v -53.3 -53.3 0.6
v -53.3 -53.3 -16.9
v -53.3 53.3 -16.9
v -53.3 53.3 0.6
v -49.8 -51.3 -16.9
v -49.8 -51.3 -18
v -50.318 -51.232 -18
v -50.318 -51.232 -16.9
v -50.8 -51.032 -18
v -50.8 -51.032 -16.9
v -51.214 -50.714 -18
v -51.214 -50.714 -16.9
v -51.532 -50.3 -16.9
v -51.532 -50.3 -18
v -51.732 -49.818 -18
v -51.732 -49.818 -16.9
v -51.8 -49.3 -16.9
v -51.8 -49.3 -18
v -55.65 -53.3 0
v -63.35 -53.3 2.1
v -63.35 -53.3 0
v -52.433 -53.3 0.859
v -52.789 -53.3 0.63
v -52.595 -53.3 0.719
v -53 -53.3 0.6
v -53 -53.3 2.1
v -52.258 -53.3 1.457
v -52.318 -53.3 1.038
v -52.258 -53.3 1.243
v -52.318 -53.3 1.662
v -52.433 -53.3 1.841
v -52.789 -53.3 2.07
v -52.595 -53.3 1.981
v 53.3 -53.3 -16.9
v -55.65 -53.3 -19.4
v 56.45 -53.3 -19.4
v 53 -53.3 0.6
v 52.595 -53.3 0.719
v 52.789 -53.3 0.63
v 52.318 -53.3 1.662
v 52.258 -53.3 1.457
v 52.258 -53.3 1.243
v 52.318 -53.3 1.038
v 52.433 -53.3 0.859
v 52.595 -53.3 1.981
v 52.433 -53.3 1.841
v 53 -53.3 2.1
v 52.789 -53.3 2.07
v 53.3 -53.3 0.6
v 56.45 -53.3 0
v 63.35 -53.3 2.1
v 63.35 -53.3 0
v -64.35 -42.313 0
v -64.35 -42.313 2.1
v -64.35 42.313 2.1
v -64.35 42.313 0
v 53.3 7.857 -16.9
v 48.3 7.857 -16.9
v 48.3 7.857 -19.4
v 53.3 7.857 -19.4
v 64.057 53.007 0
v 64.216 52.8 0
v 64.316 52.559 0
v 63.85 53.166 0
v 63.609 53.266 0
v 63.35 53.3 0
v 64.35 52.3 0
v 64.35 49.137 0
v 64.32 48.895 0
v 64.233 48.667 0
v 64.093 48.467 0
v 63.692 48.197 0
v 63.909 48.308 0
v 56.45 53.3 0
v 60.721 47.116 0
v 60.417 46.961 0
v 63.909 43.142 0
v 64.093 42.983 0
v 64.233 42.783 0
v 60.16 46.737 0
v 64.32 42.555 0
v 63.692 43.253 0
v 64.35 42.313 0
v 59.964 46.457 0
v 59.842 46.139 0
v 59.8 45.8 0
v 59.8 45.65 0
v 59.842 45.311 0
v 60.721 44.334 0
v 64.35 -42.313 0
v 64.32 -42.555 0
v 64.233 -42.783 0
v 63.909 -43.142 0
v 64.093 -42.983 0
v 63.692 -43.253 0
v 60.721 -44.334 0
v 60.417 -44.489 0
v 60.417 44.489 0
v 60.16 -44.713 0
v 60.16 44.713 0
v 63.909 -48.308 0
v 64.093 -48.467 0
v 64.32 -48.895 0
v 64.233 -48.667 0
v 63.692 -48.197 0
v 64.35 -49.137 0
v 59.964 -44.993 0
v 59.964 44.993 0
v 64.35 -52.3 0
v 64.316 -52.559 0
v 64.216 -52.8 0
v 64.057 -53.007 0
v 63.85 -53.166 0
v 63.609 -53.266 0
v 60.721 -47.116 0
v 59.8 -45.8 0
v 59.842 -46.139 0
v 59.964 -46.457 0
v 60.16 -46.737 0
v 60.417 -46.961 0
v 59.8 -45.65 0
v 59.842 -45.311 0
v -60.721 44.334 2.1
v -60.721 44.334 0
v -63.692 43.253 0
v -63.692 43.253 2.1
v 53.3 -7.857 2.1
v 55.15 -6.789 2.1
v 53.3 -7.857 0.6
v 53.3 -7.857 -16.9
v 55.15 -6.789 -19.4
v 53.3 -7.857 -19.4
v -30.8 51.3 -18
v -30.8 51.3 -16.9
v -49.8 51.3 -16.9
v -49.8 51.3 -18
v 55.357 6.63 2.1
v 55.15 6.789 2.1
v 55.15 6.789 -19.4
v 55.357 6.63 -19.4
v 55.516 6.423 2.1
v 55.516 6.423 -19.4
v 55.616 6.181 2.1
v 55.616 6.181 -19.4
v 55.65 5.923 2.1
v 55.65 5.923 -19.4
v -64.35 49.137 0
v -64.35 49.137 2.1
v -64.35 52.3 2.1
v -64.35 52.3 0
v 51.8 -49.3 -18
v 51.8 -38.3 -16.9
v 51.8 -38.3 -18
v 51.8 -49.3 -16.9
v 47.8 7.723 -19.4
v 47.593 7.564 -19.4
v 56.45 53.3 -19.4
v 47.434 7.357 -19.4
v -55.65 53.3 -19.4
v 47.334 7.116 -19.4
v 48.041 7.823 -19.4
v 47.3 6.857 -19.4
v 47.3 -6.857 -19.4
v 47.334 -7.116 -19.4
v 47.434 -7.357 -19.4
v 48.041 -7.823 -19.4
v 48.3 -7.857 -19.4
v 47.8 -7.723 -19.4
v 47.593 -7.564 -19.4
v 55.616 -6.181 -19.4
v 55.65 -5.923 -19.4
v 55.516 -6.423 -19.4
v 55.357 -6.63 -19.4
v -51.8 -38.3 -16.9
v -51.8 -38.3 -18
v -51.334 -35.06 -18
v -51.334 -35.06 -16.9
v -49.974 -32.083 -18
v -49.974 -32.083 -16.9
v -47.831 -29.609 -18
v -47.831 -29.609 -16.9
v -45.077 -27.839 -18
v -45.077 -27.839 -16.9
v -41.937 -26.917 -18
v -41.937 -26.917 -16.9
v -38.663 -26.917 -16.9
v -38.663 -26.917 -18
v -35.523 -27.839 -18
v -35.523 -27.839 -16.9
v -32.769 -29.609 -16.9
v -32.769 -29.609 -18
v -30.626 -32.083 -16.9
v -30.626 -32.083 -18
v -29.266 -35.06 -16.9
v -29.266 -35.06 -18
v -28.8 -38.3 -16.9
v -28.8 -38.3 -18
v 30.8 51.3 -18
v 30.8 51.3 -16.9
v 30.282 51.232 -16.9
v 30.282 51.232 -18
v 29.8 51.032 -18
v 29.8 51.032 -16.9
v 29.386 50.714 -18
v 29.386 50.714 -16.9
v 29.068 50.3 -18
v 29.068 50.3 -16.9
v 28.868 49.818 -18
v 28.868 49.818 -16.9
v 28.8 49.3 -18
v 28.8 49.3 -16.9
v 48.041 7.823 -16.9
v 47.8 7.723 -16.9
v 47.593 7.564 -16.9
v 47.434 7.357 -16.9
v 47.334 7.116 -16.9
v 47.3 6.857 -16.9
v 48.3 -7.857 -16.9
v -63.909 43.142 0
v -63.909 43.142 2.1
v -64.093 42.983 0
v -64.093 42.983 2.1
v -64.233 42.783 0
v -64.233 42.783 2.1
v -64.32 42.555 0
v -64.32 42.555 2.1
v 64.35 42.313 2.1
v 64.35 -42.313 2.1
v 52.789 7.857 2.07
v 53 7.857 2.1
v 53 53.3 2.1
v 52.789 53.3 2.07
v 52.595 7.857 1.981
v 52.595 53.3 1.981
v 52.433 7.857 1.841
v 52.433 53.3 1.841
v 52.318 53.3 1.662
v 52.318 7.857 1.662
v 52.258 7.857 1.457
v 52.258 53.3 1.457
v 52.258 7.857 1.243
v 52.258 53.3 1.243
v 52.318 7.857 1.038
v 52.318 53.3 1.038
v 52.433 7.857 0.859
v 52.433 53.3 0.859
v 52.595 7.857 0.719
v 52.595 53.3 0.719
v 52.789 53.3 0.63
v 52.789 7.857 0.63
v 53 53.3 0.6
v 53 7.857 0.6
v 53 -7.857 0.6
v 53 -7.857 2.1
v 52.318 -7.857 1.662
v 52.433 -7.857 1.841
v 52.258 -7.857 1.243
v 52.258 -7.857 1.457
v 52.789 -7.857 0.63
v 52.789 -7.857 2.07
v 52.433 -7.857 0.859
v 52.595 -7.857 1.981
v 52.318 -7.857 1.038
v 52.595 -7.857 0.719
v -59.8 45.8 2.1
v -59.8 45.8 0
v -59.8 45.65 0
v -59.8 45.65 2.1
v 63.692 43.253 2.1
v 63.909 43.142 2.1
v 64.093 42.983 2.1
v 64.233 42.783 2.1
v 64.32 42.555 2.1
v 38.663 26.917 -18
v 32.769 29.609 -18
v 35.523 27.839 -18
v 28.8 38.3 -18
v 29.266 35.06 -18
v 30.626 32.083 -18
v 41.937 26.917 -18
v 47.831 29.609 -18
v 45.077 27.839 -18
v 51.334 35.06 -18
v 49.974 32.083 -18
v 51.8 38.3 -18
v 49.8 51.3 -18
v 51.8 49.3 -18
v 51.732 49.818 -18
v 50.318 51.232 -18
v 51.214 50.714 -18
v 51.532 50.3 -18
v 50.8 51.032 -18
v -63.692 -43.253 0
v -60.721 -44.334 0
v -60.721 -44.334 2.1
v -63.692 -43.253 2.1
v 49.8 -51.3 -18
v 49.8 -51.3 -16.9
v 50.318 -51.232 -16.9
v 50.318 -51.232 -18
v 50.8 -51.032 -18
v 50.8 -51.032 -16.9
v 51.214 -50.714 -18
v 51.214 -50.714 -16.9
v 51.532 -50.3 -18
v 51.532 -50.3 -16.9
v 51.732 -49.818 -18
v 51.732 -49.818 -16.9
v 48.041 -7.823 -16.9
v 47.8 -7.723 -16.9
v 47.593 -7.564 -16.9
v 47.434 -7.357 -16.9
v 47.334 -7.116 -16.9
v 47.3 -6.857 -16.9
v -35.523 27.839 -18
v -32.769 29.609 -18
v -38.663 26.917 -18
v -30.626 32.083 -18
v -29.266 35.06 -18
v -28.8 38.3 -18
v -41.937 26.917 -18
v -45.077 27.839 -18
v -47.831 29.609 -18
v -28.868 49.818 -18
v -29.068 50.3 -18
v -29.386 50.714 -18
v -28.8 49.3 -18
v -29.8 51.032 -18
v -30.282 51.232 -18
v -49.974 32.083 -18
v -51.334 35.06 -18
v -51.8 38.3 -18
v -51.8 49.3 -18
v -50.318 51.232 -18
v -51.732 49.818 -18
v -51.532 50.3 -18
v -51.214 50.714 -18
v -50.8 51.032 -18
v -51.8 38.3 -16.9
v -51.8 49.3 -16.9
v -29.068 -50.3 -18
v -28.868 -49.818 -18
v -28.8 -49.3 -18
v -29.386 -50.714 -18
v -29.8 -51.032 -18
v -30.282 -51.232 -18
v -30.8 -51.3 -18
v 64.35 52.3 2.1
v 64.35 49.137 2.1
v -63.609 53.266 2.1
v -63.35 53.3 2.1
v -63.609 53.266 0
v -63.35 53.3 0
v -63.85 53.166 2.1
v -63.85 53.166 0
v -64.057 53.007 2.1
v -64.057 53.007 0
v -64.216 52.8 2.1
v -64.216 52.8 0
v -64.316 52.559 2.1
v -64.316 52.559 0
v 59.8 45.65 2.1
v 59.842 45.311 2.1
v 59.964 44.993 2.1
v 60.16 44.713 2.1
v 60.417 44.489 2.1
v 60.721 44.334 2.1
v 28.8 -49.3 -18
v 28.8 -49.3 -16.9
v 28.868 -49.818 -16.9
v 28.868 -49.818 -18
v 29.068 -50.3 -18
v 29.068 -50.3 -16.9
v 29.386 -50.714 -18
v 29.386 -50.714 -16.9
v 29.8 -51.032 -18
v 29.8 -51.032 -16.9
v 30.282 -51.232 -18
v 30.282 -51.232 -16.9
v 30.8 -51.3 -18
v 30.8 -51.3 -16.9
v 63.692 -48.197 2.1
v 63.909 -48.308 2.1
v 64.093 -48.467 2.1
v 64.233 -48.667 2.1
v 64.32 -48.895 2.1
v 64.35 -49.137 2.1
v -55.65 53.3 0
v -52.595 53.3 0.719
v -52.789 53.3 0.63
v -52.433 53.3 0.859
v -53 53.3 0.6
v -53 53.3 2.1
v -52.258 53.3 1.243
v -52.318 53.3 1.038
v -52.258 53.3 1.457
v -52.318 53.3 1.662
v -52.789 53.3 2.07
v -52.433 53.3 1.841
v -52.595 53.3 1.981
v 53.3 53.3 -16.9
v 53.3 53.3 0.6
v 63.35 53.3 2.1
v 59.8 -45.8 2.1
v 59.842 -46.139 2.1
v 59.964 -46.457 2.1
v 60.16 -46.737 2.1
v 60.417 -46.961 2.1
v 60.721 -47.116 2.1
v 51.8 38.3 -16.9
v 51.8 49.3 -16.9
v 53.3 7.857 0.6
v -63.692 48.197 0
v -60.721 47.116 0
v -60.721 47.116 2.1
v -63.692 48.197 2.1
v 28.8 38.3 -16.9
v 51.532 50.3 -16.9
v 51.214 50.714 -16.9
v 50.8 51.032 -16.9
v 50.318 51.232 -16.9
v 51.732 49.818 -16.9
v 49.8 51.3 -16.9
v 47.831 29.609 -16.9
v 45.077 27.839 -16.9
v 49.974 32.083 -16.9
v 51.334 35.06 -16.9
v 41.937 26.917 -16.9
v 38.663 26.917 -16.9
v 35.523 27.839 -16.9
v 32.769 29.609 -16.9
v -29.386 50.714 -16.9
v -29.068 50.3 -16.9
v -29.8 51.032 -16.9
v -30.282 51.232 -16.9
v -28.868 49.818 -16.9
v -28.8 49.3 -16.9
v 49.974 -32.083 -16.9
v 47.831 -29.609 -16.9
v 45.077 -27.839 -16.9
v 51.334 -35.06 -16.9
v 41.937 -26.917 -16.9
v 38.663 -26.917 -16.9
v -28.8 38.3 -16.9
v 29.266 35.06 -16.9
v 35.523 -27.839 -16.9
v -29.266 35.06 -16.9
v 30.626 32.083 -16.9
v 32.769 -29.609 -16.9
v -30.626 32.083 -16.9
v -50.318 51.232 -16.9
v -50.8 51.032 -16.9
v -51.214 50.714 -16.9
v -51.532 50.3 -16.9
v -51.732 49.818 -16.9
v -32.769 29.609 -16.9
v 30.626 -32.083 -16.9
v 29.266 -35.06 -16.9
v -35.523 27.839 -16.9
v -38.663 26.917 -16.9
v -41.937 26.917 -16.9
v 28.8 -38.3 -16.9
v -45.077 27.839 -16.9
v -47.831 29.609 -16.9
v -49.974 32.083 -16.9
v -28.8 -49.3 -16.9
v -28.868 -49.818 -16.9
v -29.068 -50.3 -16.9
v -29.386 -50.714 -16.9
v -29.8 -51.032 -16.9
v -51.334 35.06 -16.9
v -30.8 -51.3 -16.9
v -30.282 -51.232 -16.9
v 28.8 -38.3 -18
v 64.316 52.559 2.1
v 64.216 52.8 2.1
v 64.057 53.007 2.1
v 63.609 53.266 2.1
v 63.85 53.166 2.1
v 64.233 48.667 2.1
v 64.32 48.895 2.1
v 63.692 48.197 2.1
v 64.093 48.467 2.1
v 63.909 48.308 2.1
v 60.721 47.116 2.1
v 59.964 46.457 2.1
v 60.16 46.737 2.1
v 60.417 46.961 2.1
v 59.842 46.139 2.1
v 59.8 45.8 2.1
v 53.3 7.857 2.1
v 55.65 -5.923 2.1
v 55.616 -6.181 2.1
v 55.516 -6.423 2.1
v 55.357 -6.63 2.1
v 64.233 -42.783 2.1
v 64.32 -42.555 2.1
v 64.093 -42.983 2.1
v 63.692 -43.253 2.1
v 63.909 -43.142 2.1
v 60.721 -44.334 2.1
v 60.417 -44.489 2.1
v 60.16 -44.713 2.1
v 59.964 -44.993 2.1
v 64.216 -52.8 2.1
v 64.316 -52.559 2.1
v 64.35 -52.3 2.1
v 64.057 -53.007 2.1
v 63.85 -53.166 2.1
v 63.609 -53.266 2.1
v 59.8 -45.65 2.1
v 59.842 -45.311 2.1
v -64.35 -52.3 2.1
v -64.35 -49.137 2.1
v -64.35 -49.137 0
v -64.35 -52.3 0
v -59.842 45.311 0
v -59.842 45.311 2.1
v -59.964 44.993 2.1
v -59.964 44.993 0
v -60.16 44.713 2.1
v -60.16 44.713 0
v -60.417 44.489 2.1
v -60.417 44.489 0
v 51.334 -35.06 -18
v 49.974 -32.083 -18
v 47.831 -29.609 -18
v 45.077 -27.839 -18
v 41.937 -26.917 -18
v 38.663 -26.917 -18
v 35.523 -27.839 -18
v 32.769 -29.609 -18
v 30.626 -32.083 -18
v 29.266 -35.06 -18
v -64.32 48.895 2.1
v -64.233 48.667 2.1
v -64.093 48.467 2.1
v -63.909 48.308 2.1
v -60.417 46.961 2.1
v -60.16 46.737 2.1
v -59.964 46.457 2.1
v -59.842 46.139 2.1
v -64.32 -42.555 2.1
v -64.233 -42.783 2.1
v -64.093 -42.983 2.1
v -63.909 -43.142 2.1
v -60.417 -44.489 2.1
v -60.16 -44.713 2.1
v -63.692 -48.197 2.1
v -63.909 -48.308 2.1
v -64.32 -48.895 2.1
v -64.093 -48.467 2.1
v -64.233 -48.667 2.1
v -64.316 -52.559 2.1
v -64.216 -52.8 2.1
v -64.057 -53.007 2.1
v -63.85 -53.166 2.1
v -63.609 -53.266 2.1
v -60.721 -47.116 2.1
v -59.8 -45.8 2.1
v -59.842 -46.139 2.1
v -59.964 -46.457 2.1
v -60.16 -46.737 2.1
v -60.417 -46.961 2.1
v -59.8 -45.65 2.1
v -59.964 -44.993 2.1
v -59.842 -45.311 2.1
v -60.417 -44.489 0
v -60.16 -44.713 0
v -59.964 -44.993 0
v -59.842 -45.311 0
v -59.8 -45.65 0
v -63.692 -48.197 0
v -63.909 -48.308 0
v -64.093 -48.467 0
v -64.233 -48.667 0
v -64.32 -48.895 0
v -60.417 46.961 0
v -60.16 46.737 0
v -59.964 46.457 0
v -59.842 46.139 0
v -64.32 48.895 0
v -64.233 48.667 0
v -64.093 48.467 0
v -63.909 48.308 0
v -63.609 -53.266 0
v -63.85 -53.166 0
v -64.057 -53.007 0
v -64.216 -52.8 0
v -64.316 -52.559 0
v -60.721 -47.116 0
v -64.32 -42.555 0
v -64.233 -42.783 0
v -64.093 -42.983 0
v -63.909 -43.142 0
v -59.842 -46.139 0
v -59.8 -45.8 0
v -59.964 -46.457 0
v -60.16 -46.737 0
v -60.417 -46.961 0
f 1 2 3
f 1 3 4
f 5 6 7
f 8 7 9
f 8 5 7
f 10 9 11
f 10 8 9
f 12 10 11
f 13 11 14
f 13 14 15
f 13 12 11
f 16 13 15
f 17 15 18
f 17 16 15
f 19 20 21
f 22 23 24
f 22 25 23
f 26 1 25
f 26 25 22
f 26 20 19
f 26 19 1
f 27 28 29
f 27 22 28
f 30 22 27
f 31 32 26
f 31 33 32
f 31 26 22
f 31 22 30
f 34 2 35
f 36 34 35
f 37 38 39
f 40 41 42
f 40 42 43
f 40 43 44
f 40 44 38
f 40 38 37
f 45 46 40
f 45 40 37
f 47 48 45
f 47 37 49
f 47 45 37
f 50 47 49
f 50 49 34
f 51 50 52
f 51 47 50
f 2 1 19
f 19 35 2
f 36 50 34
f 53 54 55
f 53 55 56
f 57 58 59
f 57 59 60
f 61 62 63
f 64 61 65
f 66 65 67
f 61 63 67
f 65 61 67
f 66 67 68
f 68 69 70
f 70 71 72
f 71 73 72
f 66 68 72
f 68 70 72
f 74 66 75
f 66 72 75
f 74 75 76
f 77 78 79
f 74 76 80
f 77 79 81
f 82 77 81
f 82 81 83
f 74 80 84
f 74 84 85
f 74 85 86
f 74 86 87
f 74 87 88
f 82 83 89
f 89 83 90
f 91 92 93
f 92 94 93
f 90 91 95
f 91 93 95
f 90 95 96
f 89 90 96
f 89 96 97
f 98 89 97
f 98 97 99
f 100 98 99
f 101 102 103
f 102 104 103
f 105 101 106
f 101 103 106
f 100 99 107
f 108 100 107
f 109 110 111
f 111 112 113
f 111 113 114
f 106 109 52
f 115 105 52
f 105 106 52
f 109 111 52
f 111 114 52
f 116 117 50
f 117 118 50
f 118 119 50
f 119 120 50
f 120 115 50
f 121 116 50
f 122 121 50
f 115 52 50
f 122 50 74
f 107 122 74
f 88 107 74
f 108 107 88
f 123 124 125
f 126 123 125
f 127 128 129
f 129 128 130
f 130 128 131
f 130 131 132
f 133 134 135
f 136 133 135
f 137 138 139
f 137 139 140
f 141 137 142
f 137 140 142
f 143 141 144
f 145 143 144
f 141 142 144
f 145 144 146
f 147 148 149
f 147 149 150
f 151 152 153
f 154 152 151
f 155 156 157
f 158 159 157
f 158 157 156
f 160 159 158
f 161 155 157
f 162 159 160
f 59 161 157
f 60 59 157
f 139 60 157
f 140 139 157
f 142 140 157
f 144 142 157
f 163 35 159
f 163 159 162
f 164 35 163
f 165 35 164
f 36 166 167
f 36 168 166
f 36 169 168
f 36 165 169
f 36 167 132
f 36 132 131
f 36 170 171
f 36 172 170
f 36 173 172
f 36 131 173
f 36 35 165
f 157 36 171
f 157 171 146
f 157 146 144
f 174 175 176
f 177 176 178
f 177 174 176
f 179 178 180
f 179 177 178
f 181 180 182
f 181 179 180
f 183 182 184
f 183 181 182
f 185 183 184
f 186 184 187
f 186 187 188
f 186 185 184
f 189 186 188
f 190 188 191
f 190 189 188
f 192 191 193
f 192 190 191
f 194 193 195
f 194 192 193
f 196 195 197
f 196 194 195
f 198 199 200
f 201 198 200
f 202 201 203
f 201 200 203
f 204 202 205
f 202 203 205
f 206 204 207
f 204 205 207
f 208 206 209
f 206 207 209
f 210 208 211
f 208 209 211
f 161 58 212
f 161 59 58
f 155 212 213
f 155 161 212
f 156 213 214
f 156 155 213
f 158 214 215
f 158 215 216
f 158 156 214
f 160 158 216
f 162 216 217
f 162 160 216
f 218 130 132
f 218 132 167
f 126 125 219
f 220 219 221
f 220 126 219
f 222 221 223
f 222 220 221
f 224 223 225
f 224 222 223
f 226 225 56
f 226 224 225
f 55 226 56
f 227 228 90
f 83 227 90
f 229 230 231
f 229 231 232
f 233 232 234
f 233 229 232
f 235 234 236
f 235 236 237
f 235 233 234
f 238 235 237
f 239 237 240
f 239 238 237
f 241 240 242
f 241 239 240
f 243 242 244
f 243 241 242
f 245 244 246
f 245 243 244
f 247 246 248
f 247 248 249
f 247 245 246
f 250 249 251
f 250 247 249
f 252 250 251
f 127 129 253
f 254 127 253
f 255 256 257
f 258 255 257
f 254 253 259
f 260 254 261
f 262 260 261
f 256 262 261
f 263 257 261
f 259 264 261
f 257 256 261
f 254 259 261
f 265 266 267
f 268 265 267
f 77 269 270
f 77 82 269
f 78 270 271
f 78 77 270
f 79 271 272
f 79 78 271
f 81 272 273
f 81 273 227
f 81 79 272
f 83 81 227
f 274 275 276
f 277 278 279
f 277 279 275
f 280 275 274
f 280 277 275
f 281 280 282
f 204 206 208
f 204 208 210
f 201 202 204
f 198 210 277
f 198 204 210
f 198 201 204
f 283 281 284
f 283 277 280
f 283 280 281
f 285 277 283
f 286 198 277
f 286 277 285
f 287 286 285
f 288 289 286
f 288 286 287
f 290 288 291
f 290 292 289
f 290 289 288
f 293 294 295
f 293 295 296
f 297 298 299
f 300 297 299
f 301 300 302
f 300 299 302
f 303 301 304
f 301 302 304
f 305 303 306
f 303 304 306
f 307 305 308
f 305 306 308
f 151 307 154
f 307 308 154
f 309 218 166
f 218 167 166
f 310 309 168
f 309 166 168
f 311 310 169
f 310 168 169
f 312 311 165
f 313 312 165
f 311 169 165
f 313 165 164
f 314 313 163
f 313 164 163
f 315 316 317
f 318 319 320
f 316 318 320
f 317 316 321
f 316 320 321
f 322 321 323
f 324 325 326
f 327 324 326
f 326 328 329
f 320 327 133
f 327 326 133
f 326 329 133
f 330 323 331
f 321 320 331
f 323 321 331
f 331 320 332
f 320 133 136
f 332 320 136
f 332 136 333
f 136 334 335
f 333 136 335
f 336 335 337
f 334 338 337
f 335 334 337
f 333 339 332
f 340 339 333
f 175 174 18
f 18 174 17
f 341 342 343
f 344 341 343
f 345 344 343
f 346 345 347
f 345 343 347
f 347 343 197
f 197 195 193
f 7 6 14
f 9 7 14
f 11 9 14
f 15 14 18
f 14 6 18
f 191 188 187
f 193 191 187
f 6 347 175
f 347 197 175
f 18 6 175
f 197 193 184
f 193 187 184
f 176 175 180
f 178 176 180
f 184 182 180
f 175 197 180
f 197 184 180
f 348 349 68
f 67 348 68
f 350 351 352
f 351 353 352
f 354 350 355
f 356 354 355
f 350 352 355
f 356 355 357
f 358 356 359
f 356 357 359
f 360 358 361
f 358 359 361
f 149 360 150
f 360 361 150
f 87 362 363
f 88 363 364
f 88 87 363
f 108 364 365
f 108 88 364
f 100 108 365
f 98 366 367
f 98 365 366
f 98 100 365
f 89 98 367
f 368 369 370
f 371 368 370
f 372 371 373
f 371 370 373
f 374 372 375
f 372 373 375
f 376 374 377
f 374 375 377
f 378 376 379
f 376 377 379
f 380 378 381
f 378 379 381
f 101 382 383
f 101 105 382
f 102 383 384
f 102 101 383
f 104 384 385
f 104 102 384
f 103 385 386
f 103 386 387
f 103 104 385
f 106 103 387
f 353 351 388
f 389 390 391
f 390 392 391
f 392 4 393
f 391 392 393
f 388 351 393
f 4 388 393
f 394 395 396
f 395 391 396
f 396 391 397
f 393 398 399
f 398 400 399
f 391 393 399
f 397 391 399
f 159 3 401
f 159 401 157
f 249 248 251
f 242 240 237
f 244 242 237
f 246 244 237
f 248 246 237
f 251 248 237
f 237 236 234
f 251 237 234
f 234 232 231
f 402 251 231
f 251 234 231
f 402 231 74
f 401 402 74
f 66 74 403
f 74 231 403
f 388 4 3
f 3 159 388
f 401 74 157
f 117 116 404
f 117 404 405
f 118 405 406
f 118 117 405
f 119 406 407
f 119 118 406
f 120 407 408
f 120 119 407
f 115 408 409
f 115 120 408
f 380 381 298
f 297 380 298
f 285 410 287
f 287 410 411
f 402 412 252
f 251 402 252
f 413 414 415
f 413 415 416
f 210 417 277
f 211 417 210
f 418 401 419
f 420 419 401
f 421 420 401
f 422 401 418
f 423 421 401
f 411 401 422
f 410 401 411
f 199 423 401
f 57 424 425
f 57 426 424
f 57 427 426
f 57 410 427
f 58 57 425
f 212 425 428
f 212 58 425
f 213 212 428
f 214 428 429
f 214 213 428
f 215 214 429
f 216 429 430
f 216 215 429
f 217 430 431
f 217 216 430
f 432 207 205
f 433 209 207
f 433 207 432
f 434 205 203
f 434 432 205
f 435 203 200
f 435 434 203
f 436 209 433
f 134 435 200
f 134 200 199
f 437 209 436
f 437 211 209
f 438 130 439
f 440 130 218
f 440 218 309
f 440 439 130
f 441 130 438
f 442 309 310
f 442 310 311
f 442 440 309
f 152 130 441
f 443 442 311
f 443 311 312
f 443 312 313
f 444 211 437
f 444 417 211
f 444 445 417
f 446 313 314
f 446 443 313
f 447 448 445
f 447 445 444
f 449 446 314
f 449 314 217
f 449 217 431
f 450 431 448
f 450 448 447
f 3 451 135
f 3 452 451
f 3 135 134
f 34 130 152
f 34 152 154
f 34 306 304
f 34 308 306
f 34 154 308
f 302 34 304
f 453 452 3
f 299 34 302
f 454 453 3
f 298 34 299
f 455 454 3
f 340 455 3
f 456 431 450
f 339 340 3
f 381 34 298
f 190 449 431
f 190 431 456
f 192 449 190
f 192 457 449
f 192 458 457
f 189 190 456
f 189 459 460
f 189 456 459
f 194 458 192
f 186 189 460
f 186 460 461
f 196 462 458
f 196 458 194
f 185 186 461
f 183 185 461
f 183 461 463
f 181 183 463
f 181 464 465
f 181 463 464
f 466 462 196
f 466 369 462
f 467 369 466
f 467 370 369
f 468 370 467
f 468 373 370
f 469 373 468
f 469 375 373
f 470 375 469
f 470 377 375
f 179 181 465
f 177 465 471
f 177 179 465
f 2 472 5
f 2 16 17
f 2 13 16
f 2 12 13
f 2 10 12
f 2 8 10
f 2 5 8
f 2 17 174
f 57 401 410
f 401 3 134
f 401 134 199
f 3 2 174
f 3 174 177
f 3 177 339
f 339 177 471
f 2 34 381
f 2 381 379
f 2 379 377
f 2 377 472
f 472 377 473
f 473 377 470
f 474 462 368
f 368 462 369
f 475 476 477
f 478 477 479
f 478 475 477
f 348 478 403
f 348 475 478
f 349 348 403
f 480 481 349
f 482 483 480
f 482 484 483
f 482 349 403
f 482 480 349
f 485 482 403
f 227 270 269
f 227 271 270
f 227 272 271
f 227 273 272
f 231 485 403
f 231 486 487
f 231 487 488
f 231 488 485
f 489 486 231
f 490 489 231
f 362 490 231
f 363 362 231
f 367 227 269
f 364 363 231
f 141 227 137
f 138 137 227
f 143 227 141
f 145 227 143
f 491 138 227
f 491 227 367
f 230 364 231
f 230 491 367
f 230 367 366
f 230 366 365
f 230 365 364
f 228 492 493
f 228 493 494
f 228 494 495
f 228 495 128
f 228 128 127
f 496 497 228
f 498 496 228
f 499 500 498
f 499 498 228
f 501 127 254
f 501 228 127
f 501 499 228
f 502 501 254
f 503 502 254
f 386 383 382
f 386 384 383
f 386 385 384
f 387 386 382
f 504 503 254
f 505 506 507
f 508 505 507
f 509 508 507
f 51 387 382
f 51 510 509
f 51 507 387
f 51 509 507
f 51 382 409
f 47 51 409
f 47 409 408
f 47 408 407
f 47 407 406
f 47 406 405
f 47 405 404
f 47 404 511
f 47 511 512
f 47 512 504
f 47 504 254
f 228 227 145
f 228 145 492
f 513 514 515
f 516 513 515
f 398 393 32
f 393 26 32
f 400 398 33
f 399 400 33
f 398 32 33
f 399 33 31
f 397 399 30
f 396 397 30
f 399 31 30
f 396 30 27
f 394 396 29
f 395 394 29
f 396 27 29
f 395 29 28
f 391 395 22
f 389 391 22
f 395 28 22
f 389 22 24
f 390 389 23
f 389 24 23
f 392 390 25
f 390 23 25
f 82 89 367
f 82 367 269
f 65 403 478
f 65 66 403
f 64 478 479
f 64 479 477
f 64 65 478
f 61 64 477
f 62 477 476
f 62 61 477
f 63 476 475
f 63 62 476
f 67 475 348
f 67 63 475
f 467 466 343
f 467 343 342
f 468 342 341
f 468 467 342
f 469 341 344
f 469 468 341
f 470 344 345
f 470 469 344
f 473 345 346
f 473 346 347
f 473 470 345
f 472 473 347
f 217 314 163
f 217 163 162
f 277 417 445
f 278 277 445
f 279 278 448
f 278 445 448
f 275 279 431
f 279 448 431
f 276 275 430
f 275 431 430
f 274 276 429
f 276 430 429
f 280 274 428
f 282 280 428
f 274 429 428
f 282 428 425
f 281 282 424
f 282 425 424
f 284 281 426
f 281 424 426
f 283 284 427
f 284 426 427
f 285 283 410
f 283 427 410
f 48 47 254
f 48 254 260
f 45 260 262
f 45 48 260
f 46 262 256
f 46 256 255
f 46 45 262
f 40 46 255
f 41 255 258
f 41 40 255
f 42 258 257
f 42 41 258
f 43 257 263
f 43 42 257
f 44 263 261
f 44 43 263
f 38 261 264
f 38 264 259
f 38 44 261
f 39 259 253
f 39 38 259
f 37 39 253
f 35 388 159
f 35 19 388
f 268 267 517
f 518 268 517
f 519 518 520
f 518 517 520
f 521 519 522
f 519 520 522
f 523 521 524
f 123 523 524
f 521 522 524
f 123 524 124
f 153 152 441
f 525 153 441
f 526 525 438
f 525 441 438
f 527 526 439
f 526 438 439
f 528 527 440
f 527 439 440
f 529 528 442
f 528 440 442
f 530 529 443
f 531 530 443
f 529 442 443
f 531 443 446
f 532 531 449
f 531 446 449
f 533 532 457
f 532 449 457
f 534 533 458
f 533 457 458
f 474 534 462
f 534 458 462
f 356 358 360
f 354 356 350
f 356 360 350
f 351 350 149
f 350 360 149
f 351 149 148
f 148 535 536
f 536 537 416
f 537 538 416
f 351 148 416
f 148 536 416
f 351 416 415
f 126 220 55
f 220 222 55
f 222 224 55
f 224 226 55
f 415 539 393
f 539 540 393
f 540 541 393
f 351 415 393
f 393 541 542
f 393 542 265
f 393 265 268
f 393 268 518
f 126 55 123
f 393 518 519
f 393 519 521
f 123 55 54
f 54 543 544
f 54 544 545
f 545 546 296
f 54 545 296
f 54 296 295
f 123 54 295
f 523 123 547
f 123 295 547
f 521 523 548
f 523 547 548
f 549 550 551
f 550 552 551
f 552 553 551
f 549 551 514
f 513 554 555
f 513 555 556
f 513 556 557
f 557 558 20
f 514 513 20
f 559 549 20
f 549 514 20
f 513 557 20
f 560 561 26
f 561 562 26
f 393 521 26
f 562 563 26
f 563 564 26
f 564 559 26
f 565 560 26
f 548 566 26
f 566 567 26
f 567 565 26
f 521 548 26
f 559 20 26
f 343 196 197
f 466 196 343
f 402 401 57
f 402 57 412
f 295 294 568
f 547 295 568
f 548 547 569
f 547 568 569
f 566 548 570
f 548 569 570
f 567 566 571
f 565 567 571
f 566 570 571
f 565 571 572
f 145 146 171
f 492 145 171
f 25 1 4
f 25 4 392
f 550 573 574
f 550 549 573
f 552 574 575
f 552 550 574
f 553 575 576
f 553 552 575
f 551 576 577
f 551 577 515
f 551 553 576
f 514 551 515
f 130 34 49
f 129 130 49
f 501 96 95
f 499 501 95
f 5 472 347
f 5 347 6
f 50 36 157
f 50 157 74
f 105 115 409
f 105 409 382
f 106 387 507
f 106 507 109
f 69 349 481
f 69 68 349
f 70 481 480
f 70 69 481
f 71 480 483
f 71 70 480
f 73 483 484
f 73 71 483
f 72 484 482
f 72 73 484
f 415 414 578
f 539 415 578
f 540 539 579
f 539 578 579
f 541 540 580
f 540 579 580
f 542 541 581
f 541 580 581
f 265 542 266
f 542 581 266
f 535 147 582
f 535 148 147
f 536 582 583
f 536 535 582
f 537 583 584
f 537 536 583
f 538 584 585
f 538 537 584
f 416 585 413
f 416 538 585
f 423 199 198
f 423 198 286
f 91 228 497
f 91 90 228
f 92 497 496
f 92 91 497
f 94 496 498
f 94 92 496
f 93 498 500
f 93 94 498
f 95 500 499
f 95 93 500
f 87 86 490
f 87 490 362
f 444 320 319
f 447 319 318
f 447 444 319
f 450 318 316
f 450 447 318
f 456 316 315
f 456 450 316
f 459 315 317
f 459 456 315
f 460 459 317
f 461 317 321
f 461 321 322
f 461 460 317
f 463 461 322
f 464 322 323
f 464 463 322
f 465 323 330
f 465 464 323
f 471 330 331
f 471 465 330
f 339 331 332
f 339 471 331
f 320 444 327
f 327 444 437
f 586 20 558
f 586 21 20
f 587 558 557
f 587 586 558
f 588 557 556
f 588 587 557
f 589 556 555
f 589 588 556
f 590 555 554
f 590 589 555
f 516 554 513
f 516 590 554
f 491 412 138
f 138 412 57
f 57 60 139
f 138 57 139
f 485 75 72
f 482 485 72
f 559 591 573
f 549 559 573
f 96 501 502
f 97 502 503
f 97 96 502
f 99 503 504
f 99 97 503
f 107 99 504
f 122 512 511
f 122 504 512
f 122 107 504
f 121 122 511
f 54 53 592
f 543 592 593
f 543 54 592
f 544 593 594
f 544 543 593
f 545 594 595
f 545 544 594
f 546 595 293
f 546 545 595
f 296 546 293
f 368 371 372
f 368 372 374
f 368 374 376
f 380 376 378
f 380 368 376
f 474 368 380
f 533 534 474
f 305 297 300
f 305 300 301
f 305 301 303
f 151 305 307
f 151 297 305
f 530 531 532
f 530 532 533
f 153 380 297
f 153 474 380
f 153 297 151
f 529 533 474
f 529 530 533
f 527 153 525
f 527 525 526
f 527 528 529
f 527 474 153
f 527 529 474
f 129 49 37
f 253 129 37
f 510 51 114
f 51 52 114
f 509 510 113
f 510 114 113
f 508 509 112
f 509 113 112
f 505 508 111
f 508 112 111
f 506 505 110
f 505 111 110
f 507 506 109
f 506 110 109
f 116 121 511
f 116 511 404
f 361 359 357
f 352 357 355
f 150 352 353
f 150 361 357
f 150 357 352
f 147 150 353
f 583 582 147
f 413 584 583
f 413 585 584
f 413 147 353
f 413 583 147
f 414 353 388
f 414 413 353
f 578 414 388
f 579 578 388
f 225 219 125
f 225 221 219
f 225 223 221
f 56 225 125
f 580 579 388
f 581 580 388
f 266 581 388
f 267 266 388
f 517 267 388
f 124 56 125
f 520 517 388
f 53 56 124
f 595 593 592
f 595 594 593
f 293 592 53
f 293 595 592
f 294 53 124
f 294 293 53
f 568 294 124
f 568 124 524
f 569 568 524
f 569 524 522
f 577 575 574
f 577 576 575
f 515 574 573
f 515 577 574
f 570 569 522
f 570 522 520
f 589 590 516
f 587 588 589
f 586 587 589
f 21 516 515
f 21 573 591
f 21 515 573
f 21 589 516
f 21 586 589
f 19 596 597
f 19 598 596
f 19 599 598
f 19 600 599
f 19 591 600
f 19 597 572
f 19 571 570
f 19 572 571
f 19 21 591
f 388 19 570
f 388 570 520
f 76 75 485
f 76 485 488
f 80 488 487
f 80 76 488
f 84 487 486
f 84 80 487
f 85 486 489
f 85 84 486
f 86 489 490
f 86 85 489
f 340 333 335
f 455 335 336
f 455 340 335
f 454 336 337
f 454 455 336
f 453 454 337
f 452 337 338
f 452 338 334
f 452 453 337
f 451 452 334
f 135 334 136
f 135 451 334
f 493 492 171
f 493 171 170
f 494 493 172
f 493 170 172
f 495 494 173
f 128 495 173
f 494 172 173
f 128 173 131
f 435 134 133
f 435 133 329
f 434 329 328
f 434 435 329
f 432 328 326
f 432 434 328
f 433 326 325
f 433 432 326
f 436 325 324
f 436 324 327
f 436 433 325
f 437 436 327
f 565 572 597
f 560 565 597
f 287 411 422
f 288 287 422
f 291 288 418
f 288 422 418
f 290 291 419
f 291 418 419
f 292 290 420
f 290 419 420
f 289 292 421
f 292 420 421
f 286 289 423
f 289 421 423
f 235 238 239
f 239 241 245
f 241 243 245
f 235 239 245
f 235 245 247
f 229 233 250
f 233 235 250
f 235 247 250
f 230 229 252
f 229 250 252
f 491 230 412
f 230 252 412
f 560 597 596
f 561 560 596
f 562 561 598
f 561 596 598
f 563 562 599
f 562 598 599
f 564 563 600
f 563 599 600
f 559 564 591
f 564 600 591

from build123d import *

# Parameters (mm, degrees)
PAD001_DEPTH         = 53.3
PAD002_DEPTH         = 53.3
POCKET_DEPTH         = 18
POCKET001_DEPTH      = 5
SKETCH_W             = 0.8
SKETCH_H             = 19.4
PAD_DEPTH            = 53.3
POCKET004_DEPTH      = 19.401
POCKET004_DEPTH_BACK = -2.101
FILLET_R             = 1
FILLET001_R          = 1


with BuildPart() as part:
    # Sketch001 → Pad001 (new body, symmetric)
    with BuildSketch(Plane.XZ):
        Polygon((64.35, 0), (55.65, 0), (55.65, -19.4), (0, -19.4), (0, -16.9), (53.3, -16.9), (53.3, 2.1), (64.35, 2.1), align=None)
    pad001 = extrude(amount=PAD001_DEPTH, both=True)

    # Sketch002 → Pad002 (join, symmetric)
    with BuildSketch(Plane.XZ):
        with BuildLine():
            ThreePointArc((53, 2.1), (52.25, 1.35), (53, 0.6))
            Line((53.3, 0.6), (53, 0.6))
            Line((53.3, 2.1), (53.3, 0.6))
            Line((53.3, 2.1), (53, 2.1))
        make_face()
    pad002 = extrude(amount=PAD002_DEPTH, both=True)

    # Sketch003 → Pocket (cut)
    with BuildSketch(Plane.XY):
        with BuildLine():
            ThreePointArc((28.8, 38.3), (40.3, 26.8), (51.8, 38.3))
            Line((51.8, 38.3), (51.8, 49.3))
            ThreePointArc((51.8, 49.3), (51.214214, 50.714214), (49.8, 51.3))
            Line((30.8, 51.3), (49.8, 51.3))
            ThreePointArc((30.8, 51.3), (29.385786, 50.714214), (28.8, 49.3))
            Line((28.8, 38.3), (28.8, 49.3))
        make_face()
        with BuildLine():
            ThreePointArc((51.8, -38.3), (40.3, -26.8), (28.8, -38.3))
            Line((28.8, -38.3), (28.8, -49.3))
            ThreePointArc((28.8, -49.3), (29.385786, -50.714214), (30.8, -51.3))
            Line((30.8, -51.3), (49.8, -51.3))
            ThreePointArc((49.8, -51.3), (51.214214, -50.714214), (51.8, -49.3))
            Line((51.8, -38.3), (51.8, -49.3))
        make_face()
    pocket = extrude(amount=-POCKET_DEPTH, mode=Mode.SUBTRACT)

    # Sketch004 → Pocket001 (cut)
    with BuildSketch(Plane.XY):
        with BuildLine():
            ThreePointArc((59.8, -45.8), (60.053187, -46.603007), (60.721172, -47.11557))
            Line((60.721172, -47.11557), (64.5, -48.490951))
            Line((64.5, -42.959049), (64.5, -48.490951))
            Line((60.721172, -44.33443), (64.5, -42.959049))
            ThreePointArc((60.721172, -44.33443), (60.053187, -44.846993), (59.8, -45.65))
            Line((59.8, -45.65), (59.8, -45.8))
        make_face()
        with BuildLine():
            ThreePointArc((60.721172, 47.11557), (60.053187, 46.603007), (59.8, 45.8))
            Line((59.8, 45.8), (59.8, 45.65))
            ThreePointArc((59.8, 45.65), (60.053187, 44.846993), (60.721172, 44.33443))
            Line((60.721172, 44.33443), (64.5, 42.959049))
            Line((64.5, 48.490951), (64.5, 42.959049))
            Line((60.721172, 47.11557), (64.5, 48.490951))
        make_face()
    pocket001 = extrude(amount=POCKET001_DEPTH, mode=Mode.SUBTRACT)

    # Mirrored: Pad001, Pad002, Pocket, Pocket001 across YZ
    add(pad001.mirror(Plane.YZ))
    add(pad002.mirror(Plane.YZ))
    add(pocket.mirror(Plane.YZ), mode=Mode.SUBTRACT)
    add(pocket001.mirror(Plane.YZ), mode=Mode.SUBTRACT)

    # Sketch → Pad (join, symmetric)
    with BuildSketch(Plane.XZ):
        with Locations((56.05, -9.7)):
            Rectangle(SKETCH_W, SKETCH_H)
    extrude(amount=PAD_DEPTH, both=True)

    # Sketch005 → Pocket004 (cut, two sides)
    with BuildSketch(Plane.XY) as pocket004_sk:
        Polygon((47.3, -7.856773), (47.3, 7.856773), (53.3, 7.856773), (55.65, 6.5), (55.65, -6.5), (53.3, -7.856773), align=None)
    extrude(amount=-POCKET004_DEPTH, mode=Mode.SUBTRACT)
    extrude(pocket004_sk.sketch, amount=-POCKET004_DEPTH_BACK, mode=Mode.SUBTRACT)

    # Fillet
    fillet_edges = [part.edges().sort_by_distance(p)[0] for p in [
        (64.35, -53.3, 1.05),
        (64.35, -43.013645, 1.05),
        (64.35, -48.436355, 1.05),
        (64.35, 43.013645, 1.05),
        (64.35, 48.436355, 1.05),
        (64.35, 53.3, 1.05),
        (-64.35, 53.3, 1.05),
        (-64.35, 48.436355, 1.05),
        (-64.35, 43.013645, 1.05),
        (-64.35, -48.436355, 1.05),
        (-64.35, -53.3, 1.05),
        (-64.35, -43.013645, 1.05),
    ]]
    fillet(fillet_edges, radius=FILLET_R)

    # Fillet001
    fillet001_edges = [part.edges().sort_by_distance(p)[0] for p in [
        (55.65, -6.5, -8.65),
        (55.65, 6.5, -8.65),
        (47.3, -7.856773, -18.15),
        (47.3, 7.856773, -18.15),
    ]]
    fillet(fillet001_edges, radius=FILLET001_R)


solid = part.part
